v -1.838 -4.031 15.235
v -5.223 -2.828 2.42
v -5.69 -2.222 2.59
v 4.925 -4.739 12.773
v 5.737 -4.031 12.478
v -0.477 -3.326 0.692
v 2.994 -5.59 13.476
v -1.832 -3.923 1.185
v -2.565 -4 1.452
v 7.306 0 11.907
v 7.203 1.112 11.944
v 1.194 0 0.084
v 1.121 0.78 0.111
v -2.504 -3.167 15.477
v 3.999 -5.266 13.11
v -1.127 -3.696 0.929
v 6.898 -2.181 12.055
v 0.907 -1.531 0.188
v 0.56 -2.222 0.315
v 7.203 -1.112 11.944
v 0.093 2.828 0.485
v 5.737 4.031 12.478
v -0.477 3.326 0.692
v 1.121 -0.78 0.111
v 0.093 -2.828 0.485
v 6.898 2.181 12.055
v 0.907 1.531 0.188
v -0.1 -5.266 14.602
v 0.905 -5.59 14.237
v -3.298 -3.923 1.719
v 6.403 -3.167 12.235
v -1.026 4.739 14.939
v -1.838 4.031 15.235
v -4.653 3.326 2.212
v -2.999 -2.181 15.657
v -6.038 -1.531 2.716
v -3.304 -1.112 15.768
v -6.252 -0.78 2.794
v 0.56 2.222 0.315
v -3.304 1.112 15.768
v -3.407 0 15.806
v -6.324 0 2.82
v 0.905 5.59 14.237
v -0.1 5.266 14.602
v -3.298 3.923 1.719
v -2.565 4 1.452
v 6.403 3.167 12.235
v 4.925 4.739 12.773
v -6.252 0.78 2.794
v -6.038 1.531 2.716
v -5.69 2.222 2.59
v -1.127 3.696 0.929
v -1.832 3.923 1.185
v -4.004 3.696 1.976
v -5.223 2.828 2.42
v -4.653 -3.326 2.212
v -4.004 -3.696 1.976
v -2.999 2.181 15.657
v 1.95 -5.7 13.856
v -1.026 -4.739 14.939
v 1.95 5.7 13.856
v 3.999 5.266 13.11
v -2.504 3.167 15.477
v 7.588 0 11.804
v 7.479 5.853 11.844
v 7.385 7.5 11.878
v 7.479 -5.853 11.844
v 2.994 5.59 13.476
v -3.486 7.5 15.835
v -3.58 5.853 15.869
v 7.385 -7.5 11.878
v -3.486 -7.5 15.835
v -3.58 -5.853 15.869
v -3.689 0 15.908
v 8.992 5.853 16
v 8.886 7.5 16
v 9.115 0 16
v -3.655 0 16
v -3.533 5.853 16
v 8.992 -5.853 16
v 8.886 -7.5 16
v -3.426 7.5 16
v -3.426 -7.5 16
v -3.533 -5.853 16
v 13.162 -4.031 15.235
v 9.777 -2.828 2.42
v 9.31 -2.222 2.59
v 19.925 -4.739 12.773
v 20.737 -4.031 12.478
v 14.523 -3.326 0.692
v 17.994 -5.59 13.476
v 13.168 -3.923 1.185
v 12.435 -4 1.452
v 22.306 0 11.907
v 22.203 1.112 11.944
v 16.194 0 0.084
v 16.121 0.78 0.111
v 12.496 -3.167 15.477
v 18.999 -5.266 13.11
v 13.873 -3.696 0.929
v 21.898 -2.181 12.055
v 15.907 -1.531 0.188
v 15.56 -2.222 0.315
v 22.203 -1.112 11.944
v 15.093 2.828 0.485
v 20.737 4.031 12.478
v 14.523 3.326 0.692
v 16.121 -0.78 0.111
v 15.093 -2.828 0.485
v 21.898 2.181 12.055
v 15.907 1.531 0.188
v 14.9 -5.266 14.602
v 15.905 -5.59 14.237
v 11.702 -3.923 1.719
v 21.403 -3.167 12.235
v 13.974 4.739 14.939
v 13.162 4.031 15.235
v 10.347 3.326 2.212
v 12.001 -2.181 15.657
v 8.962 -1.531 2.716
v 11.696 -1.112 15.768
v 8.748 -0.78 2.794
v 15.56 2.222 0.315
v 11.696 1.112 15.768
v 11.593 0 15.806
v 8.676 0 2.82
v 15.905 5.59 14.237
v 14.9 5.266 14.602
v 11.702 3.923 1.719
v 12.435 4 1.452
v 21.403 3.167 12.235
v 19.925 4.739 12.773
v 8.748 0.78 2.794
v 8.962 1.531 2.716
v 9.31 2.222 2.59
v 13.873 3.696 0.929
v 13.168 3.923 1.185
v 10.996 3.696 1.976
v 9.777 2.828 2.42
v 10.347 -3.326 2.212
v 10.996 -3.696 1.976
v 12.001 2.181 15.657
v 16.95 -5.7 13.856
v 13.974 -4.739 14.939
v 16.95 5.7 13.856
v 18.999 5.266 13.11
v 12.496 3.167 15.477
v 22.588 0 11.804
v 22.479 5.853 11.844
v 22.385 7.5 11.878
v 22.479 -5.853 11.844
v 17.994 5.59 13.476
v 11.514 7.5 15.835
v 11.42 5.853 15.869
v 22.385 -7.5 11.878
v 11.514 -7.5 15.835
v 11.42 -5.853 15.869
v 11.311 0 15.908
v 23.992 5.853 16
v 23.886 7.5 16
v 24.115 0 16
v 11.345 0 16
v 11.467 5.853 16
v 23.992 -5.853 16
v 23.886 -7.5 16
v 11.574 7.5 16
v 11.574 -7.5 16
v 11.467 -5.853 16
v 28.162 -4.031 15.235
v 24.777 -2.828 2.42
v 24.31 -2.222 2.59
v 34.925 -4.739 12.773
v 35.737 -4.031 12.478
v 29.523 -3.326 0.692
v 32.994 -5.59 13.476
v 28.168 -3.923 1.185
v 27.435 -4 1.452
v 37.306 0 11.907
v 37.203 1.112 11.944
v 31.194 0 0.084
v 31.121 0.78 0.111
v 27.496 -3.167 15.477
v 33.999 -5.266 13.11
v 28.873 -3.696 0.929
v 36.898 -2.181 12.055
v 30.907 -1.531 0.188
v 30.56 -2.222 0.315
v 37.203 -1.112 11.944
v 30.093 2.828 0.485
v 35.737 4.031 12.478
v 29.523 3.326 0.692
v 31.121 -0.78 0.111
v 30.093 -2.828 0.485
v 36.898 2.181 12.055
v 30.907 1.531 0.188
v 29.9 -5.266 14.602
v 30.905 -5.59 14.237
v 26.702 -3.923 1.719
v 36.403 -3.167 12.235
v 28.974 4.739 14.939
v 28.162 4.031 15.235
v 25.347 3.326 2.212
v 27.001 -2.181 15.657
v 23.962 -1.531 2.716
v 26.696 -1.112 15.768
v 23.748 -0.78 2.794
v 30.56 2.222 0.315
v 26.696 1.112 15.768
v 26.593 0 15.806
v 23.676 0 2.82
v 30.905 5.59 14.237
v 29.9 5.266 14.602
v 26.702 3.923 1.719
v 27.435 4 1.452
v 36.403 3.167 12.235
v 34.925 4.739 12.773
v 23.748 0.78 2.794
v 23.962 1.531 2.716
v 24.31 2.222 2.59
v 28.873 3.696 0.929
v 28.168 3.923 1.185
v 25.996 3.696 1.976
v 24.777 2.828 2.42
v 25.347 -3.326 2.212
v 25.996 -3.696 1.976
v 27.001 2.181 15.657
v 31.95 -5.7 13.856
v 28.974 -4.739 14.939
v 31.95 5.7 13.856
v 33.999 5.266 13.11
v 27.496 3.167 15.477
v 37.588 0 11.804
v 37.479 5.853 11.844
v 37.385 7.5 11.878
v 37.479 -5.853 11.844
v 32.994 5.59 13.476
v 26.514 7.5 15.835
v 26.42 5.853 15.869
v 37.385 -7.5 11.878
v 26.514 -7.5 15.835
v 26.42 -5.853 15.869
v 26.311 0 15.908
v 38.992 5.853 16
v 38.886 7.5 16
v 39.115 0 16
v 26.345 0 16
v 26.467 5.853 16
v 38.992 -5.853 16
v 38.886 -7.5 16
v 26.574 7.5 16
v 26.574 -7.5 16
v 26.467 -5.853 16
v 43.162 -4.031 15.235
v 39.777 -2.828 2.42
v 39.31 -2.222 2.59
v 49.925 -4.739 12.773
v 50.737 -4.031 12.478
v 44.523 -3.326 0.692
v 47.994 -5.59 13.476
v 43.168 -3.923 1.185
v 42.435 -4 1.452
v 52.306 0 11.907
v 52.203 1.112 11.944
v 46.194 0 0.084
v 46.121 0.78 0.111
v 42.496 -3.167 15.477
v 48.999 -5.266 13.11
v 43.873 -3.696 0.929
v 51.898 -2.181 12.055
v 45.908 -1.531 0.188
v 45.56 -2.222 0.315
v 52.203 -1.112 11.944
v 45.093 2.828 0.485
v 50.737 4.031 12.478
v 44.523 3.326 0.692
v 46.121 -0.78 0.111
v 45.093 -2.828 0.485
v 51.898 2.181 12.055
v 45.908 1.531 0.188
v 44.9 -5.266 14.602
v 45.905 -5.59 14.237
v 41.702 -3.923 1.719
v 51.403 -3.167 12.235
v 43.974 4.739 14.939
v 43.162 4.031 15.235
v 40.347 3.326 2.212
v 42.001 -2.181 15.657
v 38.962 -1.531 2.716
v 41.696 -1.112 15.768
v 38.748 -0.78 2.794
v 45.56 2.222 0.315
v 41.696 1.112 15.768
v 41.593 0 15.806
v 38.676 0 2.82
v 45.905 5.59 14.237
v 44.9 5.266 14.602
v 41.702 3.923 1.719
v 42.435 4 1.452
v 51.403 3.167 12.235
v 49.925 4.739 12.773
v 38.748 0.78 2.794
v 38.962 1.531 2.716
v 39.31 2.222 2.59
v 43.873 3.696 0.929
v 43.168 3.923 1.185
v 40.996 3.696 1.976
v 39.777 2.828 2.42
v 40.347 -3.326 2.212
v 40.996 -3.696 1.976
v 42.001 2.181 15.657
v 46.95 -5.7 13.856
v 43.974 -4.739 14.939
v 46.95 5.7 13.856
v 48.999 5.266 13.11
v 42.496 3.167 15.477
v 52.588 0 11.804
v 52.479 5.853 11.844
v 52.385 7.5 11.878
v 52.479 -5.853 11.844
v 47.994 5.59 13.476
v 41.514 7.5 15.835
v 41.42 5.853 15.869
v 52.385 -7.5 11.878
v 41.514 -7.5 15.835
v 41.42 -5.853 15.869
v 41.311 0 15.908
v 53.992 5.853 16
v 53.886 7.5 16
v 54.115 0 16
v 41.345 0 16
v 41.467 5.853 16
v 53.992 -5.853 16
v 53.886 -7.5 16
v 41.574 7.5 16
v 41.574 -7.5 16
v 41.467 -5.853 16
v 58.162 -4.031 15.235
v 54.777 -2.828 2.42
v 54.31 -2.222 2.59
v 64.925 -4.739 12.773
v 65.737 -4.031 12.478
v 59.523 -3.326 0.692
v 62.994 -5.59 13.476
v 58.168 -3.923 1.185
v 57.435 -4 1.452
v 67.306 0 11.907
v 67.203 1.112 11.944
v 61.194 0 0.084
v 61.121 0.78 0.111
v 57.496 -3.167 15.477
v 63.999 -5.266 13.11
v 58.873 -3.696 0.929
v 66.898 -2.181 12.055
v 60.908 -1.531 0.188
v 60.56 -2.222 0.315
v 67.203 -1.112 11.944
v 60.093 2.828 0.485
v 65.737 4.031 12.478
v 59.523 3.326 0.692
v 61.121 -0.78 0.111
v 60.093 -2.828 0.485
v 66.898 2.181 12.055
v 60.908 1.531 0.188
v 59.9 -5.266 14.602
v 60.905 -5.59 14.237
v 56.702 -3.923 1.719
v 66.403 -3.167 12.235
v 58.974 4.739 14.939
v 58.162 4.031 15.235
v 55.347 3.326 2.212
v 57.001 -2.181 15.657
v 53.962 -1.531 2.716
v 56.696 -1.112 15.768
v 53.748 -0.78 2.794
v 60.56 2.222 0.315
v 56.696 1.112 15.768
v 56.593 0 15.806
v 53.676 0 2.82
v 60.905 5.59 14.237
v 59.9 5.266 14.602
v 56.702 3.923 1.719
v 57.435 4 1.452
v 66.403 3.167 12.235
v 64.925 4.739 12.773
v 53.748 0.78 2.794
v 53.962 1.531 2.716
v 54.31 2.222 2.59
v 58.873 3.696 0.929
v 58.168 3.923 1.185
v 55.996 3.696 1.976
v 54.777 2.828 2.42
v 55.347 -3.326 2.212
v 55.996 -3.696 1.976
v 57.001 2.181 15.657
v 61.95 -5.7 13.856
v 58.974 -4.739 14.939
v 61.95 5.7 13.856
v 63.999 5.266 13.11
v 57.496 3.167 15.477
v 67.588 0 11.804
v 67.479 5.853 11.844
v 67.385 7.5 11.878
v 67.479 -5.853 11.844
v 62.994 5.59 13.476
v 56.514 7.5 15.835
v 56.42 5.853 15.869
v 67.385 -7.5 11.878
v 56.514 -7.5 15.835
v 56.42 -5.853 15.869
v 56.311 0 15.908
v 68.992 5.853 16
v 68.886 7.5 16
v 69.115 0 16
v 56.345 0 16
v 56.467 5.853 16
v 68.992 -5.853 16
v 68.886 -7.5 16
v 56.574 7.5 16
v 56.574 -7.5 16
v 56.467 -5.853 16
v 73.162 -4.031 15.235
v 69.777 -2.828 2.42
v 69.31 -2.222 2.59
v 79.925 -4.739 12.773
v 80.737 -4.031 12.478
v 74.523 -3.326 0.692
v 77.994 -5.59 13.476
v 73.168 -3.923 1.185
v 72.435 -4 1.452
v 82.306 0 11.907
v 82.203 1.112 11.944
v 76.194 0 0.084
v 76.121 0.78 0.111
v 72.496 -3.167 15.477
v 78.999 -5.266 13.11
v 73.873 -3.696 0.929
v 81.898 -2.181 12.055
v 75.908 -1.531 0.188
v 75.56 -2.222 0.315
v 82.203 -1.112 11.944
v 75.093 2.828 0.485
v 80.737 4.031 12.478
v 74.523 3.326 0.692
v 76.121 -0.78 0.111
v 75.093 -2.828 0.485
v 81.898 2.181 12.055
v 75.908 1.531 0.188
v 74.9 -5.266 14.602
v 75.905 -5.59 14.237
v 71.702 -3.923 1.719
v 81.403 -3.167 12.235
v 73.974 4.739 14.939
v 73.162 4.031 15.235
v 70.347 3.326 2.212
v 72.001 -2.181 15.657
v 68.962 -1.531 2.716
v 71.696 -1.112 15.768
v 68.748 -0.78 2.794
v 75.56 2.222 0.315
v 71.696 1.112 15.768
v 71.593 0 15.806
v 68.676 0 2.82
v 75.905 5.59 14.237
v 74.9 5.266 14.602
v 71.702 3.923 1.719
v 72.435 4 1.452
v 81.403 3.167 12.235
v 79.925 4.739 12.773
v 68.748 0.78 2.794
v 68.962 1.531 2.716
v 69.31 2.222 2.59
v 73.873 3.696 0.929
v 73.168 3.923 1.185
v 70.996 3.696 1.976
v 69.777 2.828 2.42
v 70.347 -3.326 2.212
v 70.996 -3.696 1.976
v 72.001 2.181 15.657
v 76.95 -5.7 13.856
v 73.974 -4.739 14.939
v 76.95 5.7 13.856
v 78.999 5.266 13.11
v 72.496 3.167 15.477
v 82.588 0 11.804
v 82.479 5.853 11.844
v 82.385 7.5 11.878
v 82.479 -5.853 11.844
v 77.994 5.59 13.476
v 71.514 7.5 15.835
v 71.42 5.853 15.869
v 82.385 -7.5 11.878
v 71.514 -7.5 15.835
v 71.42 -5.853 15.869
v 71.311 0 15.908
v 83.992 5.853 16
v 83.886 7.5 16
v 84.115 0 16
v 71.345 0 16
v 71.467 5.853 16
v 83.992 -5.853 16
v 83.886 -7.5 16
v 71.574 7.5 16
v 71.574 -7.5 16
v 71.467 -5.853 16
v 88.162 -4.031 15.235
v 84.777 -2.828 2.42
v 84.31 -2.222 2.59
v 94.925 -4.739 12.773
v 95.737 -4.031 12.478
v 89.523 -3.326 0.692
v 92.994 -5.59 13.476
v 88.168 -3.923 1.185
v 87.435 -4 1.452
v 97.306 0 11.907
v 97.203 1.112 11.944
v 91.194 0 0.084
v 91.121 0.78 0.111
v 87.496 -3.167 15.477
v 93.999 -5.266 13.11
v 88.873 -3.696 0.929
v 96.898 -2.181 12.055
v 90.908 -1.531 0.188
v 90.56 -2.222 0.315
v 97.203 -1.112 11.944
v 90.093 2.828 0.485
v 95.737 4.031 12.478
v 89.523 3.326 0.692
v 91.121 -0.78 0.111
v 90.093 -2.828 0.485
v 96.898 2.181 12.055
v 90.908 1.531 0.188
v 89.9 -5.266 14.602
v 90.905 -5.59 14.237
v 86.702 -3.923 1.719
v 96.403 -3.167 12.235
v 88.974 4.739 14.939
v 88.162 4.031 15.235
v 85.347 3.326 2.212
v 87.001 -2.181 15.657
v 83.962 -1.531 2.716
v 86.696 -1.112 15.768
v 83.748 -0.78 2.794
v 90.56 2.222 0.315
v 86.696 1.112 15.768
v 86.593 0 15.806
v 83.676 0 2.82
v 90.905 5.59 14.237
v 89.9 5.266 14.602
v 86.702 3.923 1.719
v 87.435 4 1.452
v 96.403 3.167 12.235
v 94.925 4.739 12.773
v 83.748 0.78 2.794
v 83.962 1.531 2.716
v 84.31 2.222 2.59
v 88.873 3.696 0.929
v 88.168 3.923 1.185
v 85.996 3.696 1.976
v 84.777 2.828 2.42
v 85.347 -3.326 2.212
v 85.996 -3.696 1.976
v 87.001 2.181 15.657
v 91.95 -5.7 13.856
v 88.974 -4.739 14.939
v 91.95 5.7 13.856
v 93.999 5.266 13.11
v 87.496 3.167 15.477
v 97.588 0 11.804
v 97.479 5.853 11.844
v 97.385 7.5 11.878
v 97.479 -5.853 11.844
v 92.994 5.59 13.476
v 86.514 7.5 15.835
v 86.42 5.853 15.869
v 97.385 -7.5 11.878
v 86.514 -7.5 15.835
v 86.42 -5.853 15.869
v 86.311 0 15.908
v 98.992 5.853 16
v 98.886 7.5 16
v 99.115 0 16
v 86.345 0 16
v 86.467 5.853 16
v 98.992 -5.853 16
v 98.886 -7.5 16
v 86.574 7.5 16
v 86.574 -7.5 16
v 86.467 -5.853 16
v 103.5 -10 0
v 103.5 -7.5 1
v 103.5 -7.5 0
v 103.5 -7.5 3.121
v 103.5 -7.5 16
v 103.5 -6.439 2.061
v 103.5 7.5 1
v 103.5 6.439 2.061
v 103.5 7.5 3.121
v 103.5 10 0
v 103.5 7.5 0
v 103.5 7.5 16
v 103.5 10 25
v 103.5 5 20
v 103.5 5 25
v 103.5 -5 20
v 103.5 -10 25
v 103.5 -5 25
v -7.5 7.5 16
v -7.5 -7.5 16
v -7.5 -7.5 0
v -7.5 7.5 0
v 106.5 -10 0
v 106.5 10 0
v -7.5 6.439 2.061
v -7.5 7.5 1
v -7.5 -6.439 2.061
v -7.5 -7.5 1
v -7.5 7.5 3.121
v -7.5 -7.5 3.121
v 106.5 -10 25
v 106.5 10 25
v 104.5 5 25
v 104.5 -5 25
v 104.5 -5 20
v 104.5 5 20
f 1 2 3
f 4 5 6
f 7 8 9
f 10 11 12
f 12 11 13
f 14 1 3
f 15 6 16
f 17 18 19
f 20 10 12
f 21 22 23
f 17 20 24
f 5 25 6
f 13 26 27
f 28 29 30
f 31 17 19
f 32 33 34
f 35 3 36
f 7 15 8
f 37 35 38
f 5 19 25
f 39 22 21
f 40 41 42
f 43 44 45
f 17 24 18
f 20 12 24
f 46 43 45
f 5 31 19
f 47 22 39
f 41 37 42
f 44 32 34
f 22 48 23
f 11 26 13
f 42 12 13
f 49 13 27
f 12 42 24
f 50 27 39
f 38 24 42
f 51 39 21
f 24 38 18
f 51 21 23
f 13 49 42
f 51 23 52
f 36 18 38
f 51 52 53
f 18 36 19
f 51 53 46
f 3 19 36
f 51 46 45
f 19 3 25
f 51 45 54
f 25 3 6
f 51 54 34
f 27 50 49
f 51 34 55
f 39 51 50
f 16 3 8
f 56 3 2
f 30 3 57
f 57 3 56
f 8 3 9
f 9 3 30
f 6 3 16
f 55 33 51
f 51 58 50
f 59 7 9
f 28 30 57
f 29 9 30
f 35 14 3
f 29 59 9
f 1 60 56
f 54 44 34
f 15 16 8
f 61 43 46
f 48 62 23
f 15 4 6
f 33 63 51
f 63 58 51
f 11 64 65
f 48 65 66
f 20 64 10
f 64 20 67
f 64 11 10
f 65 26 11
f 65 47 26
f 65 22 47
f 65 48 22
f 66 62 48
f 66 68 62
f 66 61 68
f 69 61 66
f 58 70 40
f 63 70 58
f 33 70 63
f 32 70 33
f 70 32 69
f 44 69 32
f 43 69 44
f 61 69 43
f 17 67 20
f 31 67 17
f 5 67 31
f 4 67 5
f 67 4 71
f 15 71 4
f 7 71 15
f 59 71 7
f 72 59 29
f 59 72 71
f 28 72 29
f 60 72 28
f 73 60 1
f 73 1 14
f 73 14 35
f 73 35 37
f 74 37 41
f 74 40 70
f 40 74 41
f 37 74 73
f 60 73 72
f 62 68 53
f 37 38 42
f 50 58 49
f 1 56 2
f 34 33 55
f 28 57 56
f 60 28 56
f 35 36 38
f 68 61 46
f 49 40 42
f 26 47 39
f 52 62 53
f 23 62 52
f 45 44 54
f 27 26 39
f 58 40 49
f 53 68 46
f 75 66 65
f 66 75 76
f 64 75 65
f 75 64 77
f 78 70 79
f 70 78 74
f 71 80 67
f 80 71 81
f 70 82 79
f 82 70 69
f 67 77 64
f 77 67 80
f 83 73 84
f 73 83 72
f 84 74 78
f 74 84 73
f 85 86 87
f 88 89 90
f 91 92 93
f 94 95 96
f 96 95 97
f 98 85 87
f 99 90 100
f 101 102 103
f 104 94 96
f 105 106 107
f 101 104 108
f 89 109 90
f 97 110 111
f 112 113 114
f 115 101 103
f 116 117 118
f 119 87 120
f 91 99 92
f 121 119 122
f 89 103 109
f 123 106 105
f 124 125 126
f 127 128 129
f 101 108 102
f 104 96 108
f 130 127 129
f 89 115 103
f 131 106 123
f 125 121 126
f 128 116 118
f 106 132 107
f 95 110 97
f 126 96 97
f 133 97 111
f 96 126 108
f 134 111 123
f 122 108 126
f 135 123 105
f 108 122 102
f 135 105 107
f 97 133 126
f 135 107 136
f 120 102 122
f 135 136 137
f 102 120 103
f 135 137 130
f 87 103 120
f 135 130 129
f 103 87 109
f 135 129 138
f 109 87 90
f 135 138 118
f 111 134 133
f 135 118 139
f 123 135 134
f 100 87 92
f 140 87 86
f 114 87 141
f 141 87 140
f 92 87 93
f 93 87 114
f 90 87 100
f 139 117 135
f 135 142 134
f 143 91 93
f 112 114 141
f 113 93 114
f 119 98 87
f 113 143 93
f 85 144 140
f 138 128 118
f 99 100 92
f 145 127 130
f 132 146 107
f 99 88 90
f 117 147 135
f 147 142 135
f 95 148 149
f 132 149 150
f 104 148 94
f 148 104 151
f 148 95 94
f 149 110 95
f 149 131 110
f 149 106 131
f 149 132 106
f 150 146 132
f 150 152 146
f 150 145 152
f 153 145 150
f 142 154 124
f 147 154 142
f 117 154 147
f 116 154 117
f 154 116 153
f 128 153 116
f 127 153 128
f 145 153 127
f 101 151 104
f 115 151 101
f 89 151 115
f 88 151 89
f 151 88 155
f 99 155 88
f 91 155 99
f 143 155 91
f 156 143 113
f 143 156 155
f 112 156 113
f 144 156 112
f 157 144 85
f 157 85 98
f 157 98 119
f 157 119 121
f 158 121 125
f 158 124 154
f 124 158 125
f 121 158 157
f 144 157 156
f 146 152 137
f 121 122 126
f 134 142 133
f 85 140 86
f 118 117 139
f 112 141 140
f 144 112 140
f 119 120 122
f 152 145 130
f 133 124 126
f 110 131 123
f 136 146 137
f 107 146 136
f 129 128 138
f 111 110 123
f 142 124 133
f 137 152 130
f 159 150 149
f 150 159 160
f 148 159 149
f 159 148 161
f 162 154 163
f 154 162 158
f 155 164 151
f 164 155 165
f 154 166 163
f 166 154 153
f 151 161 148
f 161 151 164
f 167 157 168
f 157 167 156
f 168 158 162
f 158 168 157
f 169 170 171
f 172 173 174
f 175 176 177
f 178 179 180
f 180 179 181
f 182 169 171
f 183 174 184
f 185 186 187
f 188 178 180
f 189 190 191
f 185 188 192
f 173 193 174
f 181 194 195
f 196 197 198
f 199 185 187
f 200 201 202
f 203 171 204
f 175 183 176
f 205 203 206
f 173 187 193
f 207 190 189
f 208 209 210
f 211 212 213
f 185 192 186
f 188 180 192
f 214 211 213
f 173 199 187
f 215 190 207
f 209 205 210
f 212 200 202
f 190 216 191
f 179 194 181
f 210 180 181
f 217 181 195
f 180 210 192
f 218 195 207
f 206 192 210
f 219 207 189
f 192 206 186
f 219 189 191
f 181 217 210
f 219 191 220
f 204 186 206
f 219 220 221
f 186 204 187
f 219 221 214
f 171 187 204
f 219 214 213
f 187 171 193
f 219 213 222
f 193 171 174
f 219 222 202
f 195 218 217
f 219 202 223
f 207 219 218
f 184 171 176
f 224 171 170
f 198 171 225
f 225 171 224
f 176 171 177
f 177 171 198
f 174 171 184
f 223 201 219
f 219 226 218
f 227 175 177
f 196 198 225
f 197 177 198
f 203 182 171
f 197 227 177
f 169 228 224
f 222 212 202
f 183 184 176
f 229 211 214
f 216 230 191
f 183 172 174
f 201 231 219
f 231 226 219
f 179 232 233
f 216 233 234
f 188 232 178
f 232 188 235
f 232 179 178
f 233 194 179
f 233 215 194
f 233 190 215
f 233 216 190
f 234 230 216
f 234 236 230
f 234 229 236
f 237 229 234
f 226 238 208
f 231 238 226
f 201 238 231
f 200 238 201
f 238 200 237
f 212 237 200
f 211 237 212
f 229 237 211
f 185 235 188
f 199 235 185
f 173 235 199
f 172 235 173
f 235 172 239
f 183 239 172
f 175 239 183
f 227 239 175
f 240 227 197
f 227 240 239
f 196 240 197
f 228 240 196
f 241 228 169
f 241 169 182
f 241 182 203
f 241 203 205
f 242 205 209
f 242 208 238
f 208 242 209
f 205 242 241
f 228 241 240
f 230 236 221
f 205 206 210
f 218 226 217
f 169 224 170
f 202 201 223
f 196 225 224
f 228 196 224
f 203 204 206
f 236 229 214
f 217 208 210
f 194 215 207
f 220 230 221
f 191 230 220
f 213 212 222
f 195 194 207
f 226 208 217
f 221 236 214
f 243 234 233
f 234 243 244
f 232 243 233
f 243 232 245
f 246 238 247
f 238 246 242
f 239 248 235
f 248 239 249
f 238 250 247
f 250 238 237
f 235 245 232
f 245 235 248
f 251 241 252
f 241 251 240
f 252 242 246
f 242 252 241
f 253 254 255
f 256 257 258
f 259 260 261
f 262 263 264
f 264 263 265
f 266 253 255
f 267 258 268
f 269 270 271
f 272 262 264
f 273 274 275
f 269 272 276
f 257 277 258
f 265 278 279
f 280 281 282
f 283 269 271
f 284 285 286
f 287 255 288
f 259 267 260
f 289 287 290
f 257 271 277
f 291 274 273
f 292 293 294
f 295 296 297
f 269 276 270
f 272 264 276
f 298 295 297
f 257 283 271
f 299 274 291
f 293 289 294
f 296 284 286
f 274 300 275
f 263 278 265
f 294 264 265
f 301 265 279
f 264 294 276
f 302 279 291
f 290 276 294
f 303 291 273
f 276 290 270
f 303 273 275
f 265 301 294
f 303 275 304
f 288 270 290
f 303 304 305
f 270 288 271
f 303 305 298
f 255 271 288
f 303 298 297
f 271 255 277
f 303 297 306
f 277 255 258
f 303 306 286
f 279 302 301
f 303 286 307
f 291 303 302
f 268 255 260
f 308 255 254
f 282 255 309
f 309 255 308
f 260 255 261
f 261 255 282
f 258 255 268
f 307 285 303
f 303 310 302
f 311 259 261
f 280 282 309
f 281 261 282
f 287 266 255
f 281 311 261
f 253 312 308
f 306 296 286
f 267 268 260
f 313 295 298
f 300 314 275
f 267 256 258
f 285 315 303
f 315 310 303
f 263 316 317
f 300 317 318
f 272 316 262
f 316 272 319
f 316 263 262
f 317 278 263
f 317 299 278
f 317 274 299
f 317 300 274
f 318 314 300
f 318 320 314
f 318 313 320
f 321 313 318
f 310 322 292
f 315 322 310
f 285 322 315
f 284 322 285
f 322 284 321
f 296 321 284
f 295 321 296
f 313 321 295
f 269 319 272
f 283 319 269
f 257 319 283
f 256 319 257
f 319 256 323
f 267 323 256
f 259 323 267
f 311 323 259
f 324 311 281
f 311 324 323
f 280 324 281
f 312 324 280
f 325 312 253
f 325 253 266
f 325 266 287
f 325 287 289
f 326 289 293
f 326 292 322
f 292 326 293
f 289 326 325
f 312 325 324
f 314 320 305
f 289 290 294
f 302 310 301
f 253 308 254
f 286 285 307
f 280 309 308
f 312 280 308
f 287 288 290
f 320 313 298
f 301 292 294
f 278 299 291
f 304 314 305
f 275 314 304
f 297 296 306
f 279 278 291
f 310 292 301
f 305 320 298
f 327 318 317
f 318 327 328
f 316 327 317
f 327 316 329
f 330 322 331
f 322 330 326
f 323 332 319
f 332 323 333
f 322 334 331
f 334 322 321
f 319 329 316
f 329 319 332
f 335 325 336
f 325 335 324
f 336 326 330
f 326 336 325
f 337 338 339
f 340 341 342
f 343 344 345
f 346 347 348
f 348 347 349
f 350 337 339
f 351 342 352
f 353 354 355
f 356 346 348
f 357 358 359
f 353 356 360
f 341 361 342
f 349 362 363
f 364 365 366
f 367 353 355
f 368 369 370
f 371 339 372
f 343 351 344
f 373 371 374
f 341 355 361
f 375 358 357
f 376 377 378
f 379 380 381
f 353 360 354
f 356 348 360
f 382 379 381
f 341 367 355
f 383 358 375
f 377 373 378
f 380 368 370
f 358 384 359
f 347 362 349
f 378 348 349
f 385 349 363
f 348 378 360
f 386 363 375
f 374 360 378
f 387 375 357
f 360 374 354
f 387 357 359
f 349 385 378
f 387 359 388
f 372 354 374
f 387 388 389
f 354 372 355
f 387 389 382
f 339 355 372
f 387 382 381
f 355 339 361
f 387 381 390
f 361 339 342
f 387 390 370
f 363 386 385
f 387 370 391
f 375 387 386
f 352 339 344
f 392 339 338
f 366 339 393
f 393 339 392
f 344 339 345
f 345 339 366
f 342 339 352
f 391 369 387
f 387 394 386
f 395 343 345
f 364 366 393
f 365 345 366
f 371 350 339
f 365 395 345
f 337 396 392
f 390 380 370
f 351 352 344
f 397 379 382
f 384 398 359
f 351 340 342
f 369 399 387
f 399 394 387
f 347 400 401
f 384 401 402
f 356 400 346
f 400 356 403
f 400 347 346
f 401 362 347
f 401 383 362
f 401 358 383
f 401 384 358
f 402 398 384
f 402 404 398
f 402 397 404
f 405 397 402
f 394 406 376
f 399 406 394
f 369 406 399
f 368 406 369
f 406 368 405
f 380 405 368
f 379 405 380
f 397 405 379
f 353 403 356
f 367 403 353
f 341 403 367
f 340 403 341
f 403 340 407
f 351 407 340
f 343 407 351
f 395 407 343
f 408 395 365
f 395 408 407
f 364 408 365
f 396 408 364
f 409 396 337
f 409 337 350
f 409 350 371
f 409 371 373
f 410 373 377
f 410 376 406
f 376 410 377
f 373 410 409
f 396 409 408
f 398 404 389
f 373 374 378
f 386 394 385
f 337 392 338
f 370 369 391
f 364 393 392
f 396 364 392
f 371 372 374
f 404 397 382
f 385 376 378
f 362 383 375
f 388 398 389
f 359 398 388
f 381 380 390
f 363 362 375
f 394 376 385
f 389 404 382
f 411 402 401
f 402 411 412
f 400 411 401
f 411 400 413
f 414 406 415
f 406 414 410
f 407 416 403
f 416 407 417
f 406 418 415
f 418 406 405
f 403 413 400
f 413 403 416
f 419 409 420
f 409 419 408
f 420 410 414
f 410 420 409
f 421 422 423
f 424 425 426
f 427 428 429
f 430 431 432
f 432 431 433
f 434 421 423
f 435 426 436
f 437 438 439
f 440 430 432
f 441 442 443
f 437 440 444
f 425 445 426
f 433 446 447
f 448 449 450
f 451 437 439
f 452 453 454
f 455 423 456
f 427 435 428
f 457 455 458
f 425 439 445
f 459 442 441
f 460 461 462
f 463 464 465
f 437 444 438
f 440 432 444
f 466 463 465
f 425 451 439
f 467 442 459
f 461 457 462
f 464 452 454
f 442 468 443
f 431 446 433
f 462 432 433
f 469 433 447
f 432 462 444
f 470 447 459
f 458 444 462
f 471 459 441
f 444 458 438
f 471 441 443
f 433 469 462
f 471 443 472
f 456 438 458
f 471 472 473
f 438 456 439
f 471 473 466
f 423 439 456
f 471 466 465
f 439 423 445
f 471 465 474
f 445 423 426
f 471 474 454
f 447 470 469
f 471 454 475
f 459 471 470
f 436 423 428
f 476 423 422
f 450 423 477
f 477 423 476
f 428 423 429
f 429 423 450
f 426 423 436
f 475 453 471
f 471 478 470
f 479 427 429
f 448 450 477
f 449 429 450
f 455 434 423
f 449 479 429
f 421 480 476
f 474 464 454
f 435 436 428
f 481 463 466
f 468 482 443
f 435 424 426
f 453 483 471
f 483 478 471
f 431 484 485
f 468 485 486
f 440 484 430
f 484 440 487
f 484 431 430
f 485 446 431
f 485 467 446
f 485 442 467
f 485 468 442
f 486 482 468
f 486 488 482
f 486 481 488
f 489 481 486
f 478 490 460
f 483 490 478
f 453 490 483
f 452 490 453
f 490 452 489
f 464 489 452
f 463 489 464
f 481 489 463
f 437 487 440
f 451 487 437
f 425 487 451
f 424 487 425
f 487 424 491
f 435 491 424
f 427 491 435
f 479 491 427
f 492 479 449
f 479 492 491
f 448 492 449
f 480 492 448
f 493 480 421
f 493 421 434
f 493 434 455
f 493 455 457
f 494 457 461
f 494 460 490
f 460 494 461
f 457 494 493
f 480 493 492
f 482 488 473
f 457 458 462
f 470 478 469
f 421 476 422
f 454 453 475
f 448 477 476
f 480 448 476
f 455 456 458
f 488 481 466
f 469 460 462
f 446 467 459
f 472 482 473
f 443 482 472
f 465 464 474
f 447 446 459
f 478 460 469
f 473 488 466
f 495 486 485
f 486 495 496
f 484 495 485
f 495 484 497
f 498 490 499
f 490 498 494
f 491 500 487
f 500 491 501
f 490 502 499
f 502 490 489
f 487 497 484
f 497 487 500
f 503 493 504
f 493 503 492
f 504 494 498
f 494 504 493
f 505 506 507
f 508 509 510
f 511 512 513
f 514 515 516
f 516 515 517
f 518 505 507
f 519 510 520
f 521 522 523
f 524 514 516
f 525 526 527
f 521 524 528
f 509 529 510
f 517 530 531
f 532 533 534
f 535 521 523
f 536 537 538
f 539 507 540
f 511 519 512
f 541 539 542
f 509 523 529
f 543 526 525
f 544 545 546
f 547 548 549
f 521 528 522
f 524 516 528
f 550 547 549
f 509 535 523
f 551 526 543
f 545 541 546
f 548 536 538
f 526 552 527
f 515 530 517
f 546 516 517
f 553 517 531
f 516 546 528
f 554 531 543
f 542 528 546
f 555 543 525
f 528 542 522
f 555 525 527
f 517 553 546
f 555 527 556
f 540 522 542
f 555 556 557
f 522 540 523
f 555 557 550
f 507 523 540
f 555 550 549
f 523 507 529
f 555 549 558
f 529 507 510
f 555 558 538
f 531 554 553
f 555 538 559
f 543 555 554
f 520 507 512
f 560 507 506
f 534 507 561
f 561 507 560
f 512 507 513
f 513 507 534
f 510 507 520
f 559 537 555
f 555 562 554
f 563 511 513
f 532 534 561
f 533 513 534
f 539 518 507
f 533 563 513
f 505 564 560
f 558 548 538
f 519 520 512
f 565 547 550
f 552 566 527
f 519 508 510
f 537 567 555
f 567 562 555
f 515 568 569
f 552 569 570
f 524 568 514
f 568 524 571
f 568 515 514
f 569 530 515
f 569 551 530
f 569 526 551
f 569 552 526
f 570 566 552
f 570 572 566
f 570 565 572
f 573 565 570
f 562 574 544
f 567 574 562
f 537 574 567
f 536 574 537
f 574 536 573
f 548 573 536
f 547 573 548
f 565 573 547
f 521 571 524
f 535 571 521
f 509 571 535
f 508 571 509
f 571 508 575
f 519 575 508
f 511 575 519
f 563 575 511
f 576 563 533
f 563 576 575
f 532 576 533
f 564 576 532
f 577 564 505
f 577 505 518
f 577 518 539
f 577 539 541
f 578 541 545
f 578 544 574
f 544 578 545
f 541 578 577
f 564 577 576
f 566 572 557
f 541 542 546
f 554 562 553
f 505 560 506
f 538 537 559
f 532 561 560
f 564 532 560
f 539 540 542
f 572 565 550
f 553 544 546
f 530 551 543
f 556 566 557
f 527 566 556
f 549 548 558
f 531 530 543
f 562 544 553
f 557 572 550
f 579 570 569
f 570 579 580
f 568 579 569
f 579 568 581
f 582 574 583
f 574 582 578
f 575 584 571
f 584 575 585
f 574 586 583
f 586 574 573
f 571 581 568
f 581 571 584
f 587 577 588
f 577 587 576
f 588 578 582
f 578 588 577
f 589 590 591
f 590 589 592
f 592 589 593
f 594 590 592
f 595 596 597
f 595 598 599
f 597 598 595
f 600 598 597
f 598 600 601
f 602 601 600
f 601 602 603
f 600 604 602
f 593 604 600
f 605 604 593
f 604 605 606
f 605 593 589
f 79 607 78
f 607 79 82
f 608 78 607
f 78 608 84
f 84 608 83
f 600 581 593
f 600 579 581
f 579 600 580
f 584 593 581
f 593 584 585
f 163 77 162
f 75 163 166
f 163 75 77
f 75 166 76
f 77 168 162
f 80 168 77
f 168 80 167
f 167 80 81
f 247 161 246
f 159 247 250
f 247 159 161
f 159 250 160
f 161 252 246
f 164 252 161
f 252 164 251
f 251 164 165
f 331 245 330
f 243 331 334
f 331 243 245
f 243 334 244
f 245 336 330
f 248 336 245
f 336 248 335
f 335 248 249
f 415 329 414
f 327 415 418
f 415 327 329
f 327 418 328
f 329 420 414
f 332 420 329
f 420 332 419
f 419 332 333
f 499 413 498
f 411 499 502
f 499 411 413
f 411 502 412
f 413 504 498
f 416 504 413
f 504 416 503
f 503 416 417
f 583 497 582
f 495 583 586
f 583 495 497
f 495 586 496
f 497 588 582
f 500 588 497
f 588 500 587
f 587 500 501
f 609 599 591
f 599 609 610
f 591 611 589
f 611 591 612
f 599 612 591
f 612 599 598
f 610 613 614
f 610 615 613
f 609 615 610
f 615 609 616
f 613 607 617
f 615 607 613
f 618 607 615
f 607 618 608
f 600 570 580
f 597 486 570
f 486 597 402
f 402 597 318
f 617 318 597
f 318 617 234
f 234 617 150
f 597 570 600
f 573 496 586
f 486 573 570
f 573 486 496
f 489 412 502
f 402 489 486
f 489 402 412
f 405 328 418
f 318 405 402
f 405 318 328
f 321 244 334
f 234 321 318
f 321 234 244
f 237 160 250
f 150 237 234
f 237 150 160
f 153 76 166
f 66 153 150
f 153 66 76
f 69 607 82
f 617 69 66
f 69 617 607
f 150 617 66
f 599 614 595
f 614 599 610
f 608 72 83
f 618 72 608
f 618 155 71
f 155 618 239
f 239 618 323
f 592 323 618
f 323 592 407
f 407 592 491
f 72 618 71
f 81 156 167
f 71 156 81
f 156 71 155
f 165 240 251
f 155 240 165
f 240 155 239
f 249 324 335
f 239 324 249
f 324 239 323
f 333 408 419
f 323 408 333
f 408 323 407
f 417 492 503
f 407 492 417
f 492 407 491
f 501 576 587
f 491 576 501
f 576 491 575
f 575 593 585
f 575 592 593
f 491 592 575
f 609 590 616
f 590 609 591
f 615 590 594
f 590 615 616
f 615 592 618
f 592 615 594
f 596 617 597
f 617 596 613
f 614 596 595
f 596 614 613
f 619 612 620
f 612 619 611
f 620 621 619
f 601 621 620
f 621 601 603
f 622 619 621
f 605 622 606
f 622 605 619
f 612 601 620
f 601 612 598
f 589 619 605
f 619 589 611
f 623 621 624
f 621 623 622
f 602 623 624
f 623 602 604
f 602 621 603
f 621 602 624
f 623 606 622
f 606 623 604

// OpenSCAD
// Which one would you like to see?
part = "Drawer"; // [Drawer:Drawer Only,Casing:Casing Only,both:Drawer and Casing]

//Number of Slots
Slots=7; // [1:21]

/////////////////////////////////
//simple parametric ER11 Collet Drawer by Christoph Queck
//chris@q3d.de

i=Slots;
if (part=="Drawer"){drawer();}
if (part=="Casing"){rotate([0,-90,0])hulle();}

if (part=="both"){

translate([18,26,9.25])rotate([0,-90,0])
hulle();
drawer();

}

//crosscut();
module crosscut(){
    
intersection(){
    union(){
hulle();
drawer();
    }
    rotate([0,90,0])cylinder(r=100,h=0.5);
}}
module hulle(){
    difference(){
    translate([15*(i-1)/2+2,0,11.5])cube([15*i+7.5,20,27],center=true);
        
        difference(){
            translate([15*(i-1)/2+5,0,11.25])cube([15*i+10.5,15.5,23],center=true);
            translate([-7.5,-8,1])rotate([45,0,0])cube([15*i+6,1.5,1.5]);
            translate([-7.5,8,1])rotate([45,0,0])cube([15*i+6,1.5,1.5]);
            }
    }
    }


module drawer(){
union(){
difference(){
translate([15*(i-1)/2+3,0,8])cube([15*i+6,15,16],center=true);
for(j=[0:(i-1)]){
translate([15*j,0,0.5+8])
rotate([0,20,0])translate([0,0,-7.5])union(){
cylinder(r1=4,r2=5.7,h=13.2,$fn=32);
   translate([0,0,13.2])scale([1,5,1])cylinder(r=6,h=10,$fn=32); 
}}
translate([-7.5,-7.5,1])rotate([45,0,0])cube([15*i+6,1.5,1.5]);
translate([-7.5,7.5,1])rotate([45,0,0])cube([15*i+6,1.5,1.5]);

//rotate([0,90,0])cylinder(r=2.25,h=10,$fn=32,center=true);
}
difference(){
translate([15*i,0,12.5])cube([3,20,25],center=true);
    translate([15*i-1.5,0,25])cube([2,10,10],center=true);
}
}
}
